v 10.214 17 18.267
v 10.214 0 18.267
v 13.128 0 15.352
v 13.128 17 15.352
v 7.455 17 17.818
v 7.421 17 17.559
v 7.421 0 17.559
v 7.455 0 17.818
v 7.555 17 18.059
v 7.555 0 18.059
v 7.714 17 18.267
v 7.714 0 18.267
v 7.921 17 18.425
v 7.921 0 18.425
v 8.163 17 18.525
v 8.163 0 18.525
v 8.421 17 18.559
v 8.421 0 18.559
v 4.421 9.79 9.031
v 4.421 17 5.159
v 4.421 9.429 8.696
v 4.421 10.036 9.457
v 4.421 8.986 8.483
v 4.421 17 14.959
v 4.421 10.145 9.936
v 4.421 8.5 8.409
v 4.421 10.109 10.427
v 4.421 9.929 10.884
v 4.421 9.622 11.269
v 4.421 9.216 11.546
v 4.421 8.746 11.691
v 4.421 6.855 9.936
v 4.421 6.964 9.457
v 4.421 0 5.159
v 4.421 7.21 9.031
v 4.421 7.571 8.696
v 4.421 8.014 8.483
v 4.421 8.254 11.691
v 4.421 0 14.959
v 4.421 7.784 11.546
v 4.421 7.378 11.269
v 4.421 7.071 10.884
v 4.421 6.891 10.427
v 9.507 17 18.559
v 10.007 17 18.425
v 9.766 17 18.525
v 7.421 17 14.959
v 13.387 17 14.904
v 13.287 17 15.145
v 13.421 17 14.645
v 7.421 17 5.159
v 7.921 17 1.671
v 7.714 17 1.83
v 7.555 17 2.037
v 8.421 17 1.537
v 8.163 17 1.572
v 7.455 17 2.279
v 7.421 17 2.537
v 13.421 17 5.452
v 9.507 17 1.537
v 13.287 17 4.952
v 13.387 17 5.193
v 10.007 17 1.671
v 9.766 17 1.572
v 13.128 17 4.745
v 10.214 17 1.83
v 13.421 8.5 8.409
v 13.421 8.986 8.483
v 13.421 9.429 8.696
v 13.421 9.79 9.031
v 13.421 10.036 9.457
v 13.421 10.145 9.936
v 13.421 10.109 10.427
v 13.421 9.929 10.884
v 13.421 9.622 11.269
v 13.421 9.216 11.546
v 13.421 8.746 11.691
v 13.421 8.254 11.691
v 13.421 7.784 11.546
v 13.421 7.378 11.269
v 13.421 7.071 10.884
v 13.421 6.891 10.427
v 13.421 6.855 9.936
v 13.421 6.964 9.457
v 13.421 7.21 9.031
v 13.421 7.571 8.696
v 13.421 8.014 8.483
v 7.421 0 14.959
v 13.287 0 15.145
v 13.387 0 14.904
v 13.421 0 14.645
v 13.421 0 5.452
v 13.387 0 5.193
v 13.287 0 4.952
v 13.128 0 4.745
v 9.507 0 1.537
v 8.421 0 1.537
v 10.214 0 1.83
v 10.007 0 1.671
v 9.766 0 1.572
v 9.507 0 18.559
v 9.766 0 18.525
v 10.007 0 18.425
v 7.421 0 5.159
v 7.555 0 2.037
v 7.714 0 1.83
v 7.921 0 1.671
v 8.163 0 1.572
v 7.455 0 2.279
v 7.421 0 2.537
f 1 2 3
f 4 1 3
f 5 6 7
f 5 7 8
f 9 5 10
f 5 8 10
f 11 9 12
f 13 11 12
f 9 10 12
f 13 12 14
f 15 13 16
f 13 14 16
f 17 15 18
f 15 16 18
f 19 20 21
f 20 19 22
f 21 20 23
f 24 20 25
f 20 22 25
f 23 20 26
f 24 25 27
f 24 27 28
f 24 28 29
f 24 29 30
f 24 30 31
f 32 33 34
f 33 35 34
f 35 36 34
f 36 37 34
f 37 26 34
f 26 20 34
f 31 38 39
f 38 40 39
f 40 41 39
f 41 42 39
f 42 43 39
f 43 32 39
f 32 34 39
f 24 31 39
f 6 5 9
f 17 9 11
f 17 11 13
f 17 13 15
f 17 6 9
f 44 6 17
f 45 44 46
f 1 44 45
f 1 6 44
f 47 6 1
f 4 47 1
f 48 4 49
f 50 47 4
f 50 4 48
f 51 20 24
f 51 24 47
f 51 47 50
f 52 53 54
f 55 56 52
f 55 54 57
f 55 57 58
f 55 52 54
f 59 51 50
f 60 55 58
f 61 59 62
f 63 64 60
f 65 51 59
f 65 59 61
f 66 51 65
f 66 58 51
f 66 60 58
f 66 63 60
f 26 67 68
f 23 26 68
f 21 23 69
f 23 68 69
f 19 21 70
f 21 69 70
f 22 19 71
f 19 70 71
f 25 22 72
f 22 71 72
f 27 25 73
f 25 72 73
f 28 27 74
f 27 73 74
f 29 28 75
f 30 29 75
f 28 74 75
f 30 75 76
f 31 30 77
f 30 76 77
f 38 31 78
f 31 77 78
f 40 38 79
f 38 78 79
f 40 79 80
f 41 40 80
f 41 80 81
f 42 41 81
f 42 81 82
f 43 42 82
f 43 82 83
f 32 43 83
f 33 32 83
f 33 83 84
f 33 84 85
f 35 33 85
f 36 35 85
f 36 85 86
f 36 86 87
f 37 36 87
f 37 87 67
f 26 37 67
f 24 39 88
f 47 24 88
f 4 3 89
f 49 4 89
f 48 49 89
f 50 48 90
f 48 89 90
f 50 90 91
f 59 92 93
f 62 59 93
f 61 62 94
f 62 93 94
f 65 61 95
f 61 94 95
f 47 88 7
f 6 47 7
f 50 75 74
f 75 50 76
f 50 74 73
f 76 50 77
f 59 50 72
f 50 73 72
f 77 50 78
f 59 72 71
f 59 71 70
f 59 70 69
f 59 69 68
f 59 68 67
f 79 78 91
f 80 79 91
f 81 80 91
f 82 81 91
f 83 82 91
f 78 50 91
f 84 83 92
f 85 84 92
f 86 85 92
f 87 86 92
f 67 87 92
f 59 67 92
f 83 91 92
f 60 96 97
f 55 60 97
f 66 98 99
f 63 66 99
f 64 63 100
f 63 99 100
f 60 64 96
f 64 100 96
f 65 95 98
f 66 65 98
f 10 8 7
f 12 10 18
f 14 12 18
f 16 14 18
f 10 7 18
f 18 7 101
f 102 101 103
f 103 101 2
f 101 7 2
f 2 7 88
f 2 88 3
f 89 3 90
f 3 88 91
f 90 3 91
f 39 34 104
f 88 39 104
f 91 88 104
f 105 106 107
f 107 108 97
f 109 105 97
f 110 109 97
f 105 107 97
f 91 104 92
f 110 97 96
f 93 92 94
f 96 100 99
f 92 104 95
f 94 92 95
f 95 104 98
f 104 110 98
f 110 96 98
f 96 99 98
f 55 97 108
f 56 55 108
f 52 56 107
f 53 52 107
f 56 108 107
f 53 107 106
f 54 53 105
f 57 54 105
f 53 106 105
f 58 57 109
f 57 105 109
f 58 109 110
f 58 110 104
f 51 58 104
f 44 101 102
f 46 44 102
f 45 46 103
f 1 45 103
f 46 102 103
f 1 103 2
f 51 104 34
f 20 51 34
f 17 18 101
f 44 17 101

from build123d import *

# Parameters (mm, degrees)
BOSS_EXTRUDE1_DEPTH = 17
M4_TAPPED_HOLE1_D   = 3.3


with BuildPart() as part:
    # Sketch1 → Boss-Extrude1 (new body)
    with BuildSketch(Plane(origin=(0, 0, 0), x_dir=(1, 0, 0), z_dir=(0, 1, 0))):
        with BuildLine():
            Line((10.214282758, -18.266545266), (13.128495977, -15.352332485))
            ThreePointArc((13.128495977, -15.352332485), (13.345268844, -15.027908548), (13.421388977, -14.645224485))
            Line((13.421388977, -14.645224485), (13.421388977, -5.451641485))
            ThreePointArc((13.421388977, -5.451641485), (13.345268461, -5.068958498), (13.128495977, -4.744535485))
            Line((13.128495977, -4.744535485), (10.214282758, -1.830320704))
            ThreePointArc((10.214282758, -1.830320704), (9.889859409, -1.613547953), (9.507175977, -1.537427485))
            Line((9.507175977, -1.537427485), (8.421388977, -1.537427485))
            ThreePointArc((8.421388977, -1.537427485), (7.714282177, -1.830320722), (7.421388977, -2.537427537))
            Line((7.421388977, -2.537427537), (7.421388977, -5.159438485))
            Line((7.421388977, -5.159438485), (4.421388977, -5.159438485))
            Line((4.421388977, -5.159438485), (4.421388977, -14.959438485))
            Line((4.421388977, -14.959438485), (7.421388977, -14.959438485))
            Line((7.421388977, -14.959438485), (7.421388977, -17.559438537))
            ThreePointArc((7.421388977, -17.559438537), (7.714282276, -18.266545347), (8.421389151, -18.559438485))
            Line((8.421389151, -18.559438485), (9.507176151, -18.559438485))
            ThreePointArc((9.507176151, -18.559438485), (9.88985949, -18.483317984), (10.214282758, -18.266545266))
        make_face()
    extrude(amount=BOSS_EXTRUDE1_DEPTH)

    # M4 Tapped Hole1 (through all)
    with Locations(Plane.ZY.offset(-4.421388977)):
        with Locations((10.059438485, 8.5)):
            Hole(M4_TAPPED_HOLE1_D / 2)


solid = part.part
